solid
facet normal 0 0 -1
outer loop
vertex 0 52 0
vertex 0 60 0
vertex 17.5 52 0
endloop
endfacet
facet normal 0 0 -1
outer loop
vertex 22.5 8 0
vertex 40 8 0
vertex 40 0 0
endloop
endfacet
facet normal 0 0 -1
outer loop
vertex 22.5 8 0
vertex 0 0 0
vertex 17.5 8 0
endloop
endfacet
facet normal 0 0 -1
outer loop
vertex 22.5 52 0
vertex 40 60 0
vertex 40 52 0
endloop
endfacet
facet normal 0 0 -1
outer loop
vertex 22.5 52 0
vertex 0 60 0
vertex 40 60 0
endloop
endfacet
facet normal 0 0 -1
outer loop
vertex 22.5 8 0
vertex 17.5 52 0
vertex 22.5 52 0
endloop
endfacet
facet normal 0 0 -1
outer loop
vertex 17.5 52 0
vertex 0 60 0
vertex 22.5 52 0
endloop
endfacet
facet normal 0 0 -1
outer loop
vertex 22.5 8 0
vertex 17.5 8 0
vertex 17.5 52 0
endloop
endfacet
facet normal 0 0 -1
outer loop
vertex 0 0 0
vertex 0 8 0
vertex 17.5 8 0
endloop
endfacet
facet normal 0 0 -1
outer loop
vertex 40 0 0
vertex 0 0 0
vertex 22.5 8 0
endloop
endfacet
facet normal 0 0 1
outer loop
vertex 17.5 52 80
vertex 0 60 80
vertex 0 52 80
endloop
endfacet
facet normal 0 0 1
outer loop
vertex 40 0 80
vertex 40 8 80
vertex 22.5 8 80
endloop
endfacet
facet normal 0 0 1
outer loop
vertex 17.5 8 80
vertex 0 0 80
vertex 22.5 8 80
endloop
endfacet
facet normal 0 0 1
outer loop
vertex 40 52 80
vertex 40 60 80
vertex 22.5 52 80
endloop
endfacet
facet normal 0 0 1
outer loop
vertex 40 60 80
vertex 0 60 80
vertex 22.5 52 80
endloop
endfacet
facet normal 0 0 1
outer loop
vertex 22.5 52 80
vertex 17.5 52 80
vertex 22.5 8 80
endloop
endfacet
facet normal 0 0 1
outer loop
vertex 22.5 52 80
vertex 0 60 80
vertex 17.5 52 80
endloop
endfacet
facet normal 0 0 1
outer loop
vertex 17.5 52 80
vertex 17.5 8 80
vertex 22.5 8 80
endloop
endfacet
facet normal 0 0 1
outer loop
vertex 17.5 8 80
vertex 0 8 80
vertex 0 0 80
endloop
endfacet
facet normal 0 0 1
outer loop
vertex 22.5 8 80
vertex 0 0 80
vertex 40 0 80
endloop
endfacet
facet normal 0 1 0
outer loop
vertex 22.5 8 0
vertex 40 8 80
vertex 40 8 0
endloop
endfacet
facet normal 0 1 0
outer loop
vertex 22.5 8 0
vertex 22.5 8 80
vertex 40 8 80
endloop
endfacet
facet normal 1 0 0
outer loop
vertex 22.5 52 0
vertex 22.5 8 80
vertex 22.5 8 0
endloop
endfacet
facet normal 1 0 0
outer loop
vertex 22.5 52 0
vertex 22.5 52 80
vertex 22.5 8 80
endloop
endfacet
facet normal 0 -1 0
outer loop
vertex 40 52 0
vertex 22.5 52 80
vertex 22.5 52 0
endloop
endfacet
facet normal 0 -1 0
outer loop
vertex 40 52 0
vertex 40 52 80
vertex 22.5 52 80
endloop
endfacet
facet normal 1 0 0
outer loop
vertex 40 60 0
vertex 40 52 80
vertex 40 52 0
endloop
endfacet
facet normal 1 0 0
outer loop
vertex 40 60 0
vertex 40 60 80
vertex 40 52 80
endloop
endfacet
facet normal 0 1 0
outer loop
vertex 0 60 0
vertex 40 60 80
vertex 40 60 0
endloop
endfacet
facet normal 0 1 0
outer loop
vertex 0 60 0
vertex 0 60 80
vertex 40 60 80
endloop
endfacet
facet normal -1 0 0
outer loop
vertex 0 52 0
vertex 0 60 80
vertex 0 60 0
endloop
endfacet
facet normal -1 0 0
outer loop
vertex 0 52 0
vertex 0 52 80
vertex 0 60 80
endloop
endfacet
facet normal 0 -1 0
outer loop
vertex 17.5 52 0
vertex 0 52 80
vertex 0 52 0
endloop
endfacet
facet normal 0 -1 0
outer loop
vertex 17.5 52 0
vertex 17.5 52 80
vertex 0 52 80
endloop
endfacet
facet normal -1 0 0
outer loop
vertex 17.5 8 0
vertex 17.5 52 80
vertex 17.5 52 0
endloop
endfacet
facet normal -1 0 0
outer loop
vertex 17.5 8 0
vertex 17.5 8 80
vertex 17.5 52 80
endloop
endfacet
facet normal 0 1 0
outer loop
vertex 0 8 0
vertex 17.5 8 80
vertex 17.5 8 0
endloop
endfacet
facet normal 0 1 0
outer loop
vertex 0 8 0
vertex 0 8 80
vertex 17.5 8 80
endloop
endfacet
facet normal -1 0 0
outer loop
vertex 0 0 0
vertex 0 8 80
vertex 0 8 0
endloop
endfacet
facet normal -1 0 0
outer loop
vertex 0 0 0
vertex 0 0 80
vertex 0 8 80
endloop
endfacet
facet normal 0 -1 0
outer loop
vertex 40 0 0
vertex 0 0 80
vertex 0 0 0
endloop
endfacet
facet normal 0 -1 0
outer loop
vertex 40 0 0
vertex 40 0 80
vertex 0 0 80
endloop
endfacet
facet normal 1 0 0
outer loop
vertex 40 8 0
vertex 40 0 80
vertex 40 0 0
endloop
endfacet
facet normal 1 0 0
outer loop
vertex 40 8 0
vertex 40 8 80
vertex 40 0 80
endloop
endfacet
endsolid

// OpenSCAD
$fn = 32;

// ----------------------------------------------------------------------
// Structural section: ibeam 40 x 60 mm
// ----------------------------------------------------------------------

// --- parameters (mm) ---
sec_w = 40;               // section width, X
sec_h = 60;               // section height, Y
flange_t = 8;             // flange thickness
web_t = 5;                // web thickness
plate_t = 80;             // cut length, Z (extrusion height)

profile = [[0, 0], [40, 0], [40, 8], [22.5, 8], [22.5, 52], [40, 52], [40, 60], [0, 60], [0, 52], [17.5, 52], [17.5, 8], [0, 8]];  // primary outline, 12 points, counter clockwise

// --- the one profile operation ---
linear_extrude(height = plate_t) polygon(points = profile);
